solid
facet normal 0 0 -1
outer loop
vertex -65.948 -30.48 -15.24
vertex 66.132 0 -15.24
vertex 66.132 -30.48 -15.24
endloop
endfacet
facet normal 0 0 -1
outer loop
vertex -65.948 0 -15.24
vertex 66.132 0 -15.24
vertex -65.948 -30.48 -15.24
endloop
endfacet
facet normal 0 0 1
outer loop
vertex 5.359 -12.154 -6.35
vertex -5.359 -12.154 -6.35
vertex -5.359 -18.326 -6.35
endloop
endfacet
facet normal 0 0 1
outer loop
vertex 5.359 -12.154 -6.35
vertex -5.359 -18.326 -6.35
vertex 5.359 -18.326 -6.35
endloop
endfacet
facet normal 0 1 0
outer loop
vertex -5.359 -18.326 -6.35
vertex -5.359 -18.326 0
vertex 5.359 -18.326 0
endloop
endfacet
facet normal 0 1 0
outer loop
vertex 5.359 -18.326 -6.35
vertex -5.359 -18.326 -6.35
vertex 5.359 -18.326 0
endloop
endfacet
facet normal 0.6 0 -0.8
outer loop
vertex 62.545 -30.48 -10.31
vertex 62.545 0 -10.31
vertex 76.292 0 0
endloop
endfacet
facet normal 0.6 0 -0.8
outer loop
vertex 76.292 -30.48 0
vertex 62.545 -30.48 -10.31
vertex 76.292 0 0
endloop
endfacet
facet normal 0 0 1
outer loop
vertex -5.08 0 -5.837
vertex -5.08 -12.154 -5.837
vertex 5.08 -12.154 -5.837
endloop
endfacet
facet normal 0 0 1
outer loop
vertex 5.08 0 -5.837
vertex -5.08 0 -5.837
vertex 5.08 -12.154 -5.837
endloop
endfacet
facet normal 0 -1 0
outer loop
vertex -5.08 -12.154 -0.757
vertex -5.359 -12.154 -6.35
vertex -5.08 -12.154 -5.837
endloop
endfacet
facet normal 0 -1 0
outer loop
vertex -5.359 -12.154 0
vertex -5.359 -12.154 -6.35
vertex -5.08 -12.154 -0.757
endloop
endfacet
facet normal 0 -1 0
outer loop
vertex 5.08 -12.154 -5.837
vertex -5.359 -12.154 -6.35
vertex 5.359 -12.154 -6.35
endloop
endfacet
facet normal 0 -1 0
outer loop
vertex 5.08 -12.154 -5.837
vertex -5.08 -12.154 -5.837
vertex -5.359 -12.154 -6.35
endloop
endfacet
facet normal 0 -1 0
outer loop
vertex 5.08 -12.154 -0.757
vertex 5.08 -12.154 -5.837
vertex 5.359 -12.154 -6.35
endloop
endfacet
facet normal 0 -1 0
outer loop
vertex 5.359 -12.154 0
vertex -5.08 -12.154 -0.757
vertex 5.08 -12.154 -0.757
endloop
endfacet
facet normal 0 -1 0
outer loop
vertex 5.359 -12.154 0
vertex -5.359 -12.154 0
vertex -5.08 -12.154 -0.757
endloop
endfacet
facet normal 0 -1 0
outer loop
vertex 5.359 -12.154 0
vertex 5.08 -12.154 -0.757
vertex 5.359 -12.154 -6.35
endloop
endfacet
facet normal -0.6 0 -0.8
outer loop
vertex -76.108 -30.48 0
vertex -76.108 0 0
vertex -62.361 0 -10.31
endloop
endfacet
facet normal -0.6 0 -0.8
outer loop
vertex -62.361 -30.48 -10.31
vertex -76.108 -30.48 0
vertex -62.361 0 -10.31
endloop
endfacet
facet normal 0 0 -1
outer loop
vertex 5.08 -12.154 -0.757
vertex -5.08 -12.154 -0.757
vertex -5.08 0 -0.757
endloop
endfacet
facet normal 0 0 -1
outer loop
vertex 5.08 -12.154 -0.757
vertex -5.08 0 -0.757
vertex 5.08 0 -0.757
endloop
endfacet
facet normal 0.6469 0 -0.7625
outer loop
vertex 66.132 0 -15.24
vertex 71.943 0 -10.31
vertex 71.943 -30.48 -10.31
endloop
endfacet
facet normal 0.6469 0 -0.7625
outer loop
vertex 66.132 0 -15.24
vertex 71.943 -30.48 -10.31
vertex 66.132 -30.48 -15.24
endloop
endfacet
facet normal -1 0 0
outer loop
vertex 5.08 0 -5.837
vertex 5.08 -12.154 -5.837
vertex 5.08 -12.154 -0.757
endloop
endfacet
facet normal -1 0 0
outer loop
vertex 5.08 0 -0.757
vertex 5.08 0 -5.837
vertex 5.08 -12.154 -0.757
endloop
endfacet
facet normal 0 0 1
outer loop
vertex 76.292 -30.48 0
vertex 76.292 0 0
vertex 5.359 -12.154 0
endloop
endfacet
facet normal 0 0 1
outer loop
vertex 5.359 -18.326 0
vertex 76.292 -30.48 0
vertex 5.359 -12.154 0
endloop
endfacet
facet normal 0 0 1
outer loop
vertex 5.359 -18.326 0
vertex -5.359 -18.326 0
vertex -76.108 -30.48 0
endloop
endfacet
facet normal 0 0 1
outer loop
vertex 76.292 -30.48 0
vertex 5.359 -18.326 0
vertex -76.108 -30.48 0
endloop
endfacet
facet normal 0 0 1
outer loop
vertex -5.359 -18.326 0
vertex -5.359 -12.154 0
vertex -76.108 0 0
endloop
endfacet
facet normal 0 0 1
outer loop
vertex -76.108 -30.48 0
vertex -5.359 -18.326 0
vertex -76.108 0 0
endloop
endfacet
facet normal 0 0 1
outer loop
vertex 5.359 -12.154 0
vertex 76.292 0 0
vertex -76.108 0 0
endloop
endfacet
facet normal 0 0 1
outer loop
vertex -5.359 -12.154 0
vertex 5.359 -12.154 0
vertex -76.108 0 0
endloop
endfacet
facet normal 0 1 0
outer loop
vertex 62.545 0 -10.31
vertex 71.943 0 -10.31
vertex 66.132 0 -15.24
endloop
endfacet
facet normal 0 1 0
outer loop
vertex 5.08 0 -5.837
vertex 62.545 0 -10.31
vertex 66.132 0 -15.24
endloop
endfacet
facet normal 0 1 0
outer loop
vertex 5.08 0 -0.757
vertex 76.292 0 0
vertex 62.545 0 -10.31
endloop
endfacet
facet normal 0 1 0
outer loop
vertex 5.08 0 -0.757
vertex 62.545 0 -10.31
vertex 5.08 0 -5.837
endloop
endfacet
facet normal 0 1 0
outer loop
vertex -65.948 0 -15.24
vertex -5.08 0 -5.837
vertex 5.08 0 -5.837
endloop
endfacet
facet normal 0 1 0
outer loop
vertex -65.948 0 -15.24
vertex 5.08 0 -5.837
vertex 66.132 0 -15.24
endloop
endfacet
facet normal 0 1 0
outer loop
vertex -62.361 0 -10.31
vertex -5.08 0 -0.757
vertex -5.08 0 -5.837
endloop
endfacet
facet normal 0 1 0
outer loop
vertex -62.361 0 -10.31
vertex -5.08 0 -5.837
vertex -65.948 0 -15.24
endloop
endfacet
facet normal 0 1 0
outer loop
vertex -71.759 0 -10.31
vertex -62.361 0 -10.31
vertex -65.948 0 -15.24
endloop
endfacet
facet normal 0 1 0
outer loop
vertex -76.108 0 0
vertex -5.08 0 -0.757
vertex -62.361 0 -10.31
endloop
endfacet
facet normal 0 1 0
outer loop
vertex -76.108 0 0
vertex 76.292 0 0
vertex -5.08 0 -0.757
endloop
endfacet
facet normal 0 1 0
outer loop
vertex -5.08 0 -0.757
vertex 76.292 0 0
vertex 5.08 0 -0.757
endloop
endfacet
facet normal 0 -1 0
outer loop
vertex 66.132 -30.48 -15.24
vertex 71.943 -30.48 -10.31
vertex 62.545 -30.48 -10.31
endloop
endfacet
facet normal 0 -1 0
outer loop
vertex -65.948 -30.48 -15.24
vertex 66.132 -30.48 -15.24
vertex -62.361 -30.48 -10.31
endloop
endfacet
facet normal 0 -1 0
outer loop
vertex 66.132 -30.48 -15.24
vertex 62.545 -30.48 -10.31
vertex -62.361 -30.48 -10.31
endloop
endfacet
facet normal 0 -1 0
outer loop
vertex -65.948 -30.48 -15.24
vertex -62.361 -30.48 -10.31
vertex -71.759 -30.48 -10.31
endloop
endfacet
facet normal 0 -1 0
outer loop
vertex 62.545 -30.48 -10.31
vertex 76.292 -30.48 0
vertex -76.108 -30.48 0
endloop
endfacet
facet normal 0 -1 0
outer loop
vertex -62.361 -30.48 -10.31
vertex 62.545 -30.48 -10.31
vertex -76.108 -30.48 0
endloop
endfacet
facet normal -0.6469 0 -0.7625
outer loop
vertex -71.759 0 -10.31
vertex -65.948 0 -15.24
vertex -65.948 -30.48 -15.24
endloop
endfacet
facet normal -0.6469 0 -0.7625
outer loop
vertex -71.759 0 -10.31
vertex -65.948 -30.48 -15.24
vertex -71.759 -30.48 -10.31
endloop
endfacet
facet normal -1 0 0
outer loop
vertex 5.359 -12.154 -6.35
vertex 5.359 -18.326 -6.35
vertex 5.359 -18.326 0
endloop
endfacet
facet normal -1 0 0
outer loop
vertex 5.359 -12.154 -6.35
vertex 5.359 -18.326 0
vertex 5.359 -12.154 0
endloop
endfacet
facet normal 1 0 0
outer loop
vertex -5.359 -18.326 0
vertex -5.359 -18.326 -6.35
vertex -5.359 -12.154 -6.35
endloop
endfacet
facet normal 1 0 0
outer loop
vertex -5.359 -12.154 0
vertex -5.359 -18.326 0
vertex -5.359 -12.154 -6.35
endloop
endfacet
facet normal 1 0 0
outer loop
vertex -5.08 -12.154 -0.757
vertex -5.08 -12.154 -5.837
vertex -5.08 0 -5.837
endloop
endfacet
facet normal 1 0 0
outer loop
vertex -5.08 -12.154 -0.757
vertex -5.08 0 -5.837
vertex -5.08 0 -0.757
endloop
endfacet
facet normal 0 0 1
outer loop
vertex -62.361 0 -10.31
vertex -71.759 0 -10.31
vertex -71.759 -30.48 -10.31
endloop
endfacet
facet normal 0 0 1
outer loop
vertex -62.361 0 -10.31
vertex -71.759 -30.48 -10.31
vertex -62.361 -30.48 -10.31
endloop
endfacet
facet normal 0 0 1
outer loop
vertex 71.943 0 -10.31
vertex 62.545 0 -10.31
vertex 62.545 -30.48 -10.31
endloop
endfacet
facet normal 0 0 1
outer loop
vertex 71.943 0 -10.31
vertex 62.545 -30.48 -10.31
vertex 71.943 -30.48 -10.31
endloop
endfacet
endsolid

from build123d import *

# Parameters (mm, degrees)
F1_DEPTH = 30.48
F2_W     = 10.7188
F2_H     = 6.1722
F3_DEPTH = 6.35
F4_W     = 10.16
F4_H     = 5.08
F5_DEPTH = 25.4
F7_DEPTH = 30.48


with BuildPart() as f1:
    # F0 (on Front) → F1 (new body)
    with BuildSketch(Plane.XZ):
        Polygon((76.2921414277, 0), (-76.1078585723, 0), (-55.7878585723, -15.24), (55.9721414277, -15.24), align=None)
    extrude(amount=F1_DEPTH)

    # F2 (on face) → F3 (cut)
    with BuildSketch(Plane.XY):
        with Locations((0, -15.24)):
            Rectangle(F2_W, F2_H)
    extrude(amount=-F3_DEPTH, mode=Mode.SUBTRACT)

    # F4 (on face) → F5 (cut)
    with BuildSketch(Plane.XZ.offset(12.1539)):
        with Locations((0, -3.297025953)):
            Rectangle(F4_W, F4_H)
    extrude(amount=-F5_DEPTH, mode=Mode.SUBTRACT)

    # F6 (on face) → F7 (join)
    with BuildSketch(Plane(origin=(0, 0, 0), x_dir=(-1, 0, 0), z_dir=(0, 1, 0))):
        Polygon((62.3605558789, -10.31047702), (55.7878585723, -15.24), (65.9478585723, -15.24), (71.7585558789, -10.31047702), align=None)
        Polygon((-55.9721414277, -15.24), (-62.5448387344, -10.31047702), (-71.9428387344, -10.31047702), (-66.1321414277, -15.24), align=None)
    extrude(amount=-F7_DEPTH)


solid = f1.part
